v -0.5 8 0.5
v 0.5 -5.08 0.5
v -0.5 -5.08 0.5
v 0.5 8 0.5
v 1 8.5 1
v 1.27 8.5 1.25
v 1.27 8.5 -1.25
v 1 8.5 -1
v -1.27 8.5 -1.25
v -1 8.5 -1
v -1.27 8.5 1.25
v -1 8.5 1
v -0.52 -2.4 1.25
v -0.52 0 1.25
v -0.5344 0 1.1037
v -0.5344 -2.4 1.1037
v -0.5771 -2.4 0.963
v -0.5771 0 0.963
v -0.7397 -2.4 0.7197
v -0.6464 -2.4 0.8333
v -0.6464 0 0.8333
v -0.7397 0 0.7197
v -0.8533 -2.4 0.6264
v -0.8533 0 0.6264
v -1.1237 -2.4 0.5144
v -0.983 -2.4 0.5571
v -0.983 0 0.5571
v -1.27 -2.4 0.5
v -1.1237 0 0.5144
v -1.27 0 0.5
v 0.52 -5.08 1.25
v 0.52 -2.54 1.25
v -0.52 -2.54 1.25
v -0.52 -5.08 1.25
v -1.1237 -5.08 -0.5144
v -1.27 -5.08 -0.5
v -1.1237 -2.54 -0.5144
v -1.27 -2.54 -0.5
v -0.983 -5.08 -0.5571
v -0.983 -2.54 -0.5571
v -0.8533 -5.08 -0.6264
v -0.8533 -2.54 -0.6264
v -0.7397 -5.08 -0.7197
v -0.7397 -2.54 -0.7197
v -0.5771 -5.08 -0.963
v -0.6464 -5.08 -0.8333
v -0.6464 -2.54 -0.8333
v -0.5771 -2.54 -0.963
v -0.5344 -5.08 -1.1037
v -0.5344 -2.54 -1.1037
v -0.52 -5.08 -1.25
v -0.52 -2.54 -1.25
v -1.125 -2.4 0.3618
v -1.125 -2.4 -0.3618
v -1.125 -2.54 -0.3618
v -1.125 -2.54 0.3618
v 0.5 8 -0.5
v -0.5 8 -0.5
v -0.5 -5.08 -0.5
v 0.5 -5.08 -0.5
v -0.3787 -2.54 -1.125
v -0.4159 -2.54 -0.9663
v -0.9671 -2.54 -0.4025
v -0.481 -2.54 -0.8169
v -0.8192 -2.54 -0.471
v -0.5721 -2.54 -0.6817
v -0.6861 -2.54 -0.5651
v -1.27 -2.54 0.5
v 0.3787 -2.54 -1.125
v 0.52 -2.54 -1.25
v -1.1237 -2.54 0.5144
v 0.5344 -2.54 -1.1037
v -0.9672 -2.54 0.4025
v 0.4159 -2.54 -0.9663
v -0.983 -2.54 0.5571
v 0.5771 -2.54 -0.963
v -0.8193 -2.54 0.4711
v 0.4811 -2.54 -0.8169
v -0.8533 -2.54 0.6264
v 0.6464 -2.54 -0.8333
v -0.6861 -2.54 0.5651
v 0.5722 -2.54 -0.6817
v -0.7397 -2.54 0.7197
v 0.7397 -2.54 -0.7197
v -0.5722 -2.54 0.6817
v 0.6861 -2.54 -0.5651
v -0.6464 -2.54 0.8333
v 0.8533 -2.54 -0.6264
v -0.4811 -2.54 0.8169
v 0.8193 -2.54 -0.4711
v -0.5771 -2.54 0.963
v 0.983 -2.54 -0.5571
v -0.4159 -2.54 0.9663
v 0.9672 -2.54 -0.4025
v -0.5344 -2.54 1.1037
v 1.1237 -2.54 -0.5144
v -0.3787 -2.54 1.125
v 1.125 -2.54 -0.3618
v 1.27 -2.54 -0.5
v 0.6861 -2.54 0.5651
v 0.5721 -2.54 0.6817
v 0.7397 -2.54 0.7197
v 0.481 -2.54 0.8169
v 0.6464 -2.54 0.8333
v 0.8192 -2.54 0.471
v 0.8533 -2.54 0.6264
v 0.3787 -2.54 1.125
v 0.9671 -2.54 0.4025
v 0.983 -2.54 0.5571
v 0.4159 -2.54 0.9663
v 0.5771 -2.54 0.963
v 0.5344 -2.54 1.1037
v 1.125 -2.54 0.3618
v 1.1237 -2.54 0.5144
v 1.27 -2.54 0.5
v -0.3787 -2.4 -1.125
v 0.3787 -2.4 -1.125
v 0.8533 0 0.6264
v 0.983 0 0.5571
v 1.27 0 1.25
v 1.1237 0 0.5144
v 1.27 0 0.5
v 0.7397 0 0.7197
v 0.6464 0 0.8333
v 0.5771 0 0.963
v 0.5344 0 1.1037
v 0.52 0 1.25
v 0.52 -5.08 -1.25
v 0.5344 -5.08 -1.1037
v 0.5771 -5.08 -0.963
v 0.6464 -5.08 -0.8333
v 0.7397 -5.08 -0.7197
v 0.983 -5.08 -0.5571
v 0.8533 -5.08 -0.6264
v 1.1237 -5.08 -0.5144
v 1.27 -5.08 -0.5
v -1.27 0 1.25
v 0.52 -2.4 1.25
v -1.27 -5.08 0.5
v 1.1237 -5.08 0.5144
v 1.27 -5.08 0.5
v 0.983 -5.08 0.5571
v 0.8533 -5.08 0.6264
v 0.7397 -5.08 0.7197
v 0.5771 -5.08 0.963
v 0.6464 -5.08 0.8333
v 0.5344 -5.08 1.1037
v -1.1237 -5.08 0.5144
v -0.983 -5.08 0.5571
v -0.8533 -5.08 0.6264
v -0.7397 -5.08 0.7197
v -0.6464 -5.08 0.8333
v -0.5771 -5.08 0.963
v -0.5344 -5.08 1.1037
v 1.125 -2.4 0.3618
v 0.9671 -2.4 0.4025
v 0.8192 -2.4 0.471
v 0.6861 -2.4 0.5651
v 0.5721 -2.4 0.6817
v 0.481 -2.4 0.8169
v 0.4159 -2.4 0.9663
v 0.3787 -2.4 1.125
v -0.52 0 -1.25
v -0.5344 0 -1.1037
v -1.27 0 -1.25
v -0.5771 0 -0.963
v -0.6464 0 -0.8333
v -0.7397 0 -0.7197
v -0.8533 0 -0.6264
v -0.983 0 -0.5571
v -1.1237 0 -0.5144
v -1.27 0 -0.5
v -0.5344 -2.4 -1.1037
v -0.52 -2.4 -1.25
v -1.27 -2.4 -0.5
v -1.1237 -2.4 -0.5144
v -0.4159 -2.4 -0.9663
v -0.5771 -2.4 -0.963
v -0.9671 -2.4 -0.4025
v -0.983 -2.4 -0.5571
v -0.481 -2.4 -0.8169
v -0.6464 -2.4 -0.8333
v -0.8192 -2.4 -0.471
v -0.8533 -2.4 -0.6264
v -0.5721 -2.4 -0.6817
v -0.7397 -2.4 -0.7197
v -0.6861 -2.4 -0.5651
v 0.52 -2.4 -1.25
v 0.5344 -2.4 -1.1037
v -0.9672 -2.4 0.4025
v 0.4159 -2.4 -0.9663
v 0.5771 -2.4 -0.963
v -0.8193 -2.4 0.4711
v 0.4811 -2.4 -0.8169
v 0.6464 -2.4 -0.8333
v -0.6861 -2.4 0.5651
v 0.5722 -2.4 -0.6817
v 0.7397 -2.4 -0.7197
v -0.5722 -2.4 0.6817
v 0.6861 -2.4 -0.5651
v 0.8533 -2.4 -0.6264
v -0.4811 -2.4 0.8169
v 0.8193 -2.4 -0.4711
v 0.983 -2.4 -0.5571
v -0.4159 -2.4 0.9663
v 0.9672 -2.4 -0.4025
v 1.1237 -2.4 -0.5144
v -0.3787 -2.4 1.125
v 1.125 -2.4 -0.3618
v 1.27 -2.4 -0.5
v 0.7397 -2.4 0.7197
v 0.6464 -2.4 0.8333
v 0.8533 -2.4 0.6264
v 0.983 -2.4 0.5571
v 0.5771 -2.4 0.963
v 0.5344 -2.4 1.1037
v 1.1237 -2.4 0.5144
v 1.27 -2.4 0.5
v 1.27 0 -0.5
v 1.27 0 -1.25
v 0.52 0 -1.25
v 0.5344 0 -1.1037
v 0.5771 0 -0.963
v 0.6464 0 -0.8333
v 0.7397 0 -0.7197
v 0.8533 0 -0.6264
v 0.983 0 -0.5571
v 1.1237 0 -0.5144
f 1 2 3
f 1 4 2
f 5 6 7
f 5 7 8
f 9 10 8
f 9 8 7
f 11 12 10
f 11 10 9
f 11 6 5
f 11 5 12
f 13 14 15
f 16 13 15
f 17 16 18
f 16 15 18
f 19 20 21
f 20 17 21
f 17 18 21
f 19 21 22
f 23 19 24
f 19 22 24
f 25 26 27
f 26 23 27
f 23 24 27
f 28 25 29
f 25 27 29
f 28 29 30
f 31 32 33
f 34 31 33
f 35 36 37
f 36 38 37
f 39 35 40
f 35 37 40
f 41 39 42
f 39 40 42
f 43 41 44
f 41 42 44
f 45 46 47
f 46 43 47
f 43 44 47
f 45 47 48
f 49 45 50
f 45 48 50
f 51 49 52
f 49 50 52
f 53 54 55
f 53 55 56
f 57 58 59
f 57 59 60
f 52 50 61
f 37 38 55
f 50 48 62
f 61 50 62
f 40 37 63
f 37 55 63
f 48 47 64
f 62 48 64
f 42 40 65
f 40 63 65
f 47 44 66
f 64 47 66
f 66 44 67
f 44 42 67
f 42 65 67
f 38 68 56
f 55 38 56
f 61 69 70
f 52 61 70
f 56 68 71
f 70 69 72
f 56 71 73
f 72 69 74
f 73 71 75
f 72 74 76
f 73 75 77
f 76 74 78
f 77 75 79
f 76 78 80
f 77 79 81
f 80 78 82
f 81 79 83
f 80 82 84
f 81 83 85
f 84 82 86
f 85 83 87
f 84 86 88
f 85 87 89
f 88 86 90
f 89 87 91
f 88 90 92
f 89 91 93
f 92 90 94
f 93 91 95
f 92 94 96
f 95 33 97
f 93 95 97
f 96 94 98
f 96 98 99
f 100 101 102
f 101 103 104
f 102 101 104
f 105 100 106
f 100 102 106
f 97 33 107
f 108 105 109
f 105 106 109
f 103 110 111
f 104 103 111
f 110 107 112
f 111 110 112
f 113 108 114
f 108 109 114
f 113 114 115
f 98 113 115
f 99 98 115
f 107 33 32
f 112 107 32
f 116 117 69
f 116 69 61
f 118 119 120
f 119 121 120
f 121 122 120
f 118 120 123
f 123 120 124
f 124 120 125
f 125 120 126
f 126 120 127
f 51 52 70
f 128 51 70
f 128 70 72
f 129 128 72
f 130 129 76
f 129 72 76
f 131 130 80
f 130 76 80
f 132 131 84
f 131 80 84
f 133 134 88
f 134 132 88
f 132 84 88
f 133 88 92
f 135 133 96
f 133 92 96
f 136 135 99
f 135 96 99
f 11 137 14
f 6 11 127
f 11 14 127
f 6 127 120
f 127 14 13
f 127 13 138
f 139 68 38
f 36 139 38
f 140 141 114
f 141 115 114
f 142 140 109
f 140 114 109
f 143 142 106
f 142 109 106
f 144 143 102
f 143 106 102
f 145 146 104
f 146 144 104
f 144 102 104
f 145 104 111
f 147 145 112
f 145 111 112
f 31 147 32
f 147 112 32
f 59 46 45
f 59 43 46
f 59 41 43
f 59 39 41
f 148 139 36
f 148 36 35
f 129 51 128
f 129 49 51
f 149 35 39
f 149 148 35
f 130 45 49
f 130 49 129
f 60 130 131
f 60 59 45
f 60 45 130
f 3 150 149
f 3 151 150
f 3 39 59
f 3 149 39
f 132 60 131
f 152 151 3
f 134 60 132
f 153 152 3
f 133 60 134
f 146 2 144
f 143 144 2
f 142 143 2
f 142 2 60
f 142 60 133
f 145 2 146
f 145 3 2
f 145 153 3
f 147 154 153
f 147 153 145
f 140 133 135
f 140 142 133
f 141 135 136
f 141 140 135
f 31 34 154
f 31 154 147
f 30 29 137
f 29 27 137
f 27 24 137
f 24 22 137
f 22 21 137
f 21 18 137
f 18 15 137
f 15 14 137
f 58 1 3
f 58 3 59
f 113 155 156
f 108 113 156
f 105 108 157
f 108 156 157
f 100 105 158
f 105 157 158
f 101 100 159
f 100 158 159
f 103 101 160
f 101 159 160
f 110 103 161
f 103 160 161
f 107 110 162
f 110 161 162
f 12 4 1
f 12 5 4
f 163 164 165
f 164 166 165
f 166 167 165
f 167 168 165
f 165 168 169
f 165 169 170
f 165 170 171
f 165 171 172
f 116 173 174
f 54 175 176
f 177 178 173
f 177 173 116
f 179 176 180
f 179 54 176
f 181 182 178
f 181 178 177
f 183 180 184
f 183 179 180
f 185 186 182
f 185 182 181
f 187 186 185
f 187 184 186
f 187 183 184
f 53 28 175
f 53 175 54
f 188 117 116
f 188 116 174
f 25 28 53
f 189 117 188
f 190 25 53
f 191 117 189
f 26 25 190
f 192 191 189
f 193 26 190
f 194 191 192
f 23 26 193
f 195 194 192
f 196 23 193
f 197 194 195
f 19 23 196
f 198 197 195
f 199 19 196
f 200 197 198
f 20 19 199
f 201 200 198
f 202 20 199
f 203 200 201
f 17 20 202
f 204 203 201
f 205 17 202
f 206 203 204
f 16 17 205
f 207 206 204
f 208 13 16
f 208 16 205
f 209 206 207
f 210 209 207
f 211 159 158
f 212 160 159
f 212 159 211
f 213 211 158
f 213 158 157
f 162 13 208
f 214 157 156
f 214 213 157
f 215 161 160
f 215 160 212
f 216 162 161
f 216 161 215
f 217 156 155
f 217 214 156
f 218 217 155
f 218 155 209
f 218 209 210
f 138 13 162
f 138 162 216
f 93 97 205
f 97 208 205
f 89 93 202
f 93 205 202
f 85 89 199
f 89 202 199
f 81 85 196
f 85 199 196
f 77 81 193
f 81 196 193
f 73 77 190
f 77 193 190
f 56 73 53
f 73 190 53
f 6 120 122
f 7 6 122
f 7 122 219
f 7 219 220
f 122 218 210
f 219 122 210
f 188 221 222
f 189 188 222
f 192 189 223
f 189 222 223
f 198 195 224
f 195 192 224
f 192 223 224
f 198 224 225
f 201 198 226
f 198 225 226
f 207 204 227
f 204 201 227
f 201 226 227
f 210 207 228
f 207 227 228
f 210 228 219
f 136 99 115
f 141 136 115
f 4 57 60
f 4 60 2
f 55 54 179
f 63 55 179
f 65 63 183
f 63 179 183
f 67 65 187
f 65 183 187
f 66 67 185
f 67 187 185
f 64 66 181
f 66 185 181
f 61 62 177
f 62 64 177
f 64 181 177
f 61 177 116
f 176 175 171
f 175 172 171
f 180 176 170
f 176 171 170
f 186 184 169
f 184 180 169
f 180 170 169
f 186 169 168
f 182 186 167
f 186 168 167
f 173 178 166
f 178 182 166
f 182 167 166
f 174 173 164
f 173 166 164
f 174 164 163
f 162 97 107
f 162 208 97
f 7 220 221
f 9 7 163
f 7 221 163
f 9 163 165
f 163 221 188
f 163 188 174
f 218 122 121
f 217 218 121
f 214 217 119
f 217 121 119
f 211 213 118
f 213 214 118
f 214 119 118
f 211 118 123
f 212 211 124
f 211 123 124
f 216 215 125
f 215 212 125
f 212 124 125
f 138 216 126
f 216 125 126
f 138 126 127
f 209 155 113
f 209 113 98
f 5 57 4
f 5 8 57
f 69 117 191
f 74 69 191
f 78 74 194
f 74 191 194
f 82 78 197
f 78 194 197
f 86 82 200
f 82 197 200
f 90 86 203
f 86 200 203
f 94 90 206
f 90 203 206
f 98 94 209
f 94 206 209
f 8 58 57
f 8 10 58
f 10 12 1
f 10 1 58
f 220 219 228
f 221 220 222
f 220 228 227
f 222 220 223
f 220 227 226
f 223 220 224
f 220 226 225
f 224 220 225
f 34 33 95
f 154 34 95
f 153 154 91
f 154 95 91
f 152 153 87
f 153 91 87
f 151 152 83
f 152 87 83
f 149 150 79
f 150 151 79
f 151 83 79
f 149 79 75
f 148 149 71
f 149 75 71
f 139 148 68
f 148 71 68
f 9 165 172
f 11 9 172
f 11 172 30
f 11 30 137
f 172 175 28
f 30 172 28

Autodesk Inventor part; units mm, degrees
ref_plane "YZ Plane" through (0, 0, 0) normal (1, 0, 0) x (0, 1, 0)
ref_plane "XZ Plane" through (0, 0, 0) normal (0, 1, 0) x (-1, 0, 0)
ref_plane "XY Plane" through (0, 0, 0) normal (0, 0, 1) x (1, 0, 0)
sketch "Sketch1" plane through (0, 0, 0) normal (0, 1, 0) x (-1, 0, 0)
  line L0 (1.27, 1.25) -> (-1.27, 1.25)
  line L1 (-1.27, 1.25) -> (-1.27, -1.25)
  line L2 (-1.27, -1.25) -> (1.27, -1.25)
  line L3 (1.27, -1.25) -> (1.27, 1.25)
  line L4 (1.27, 1.25) -> (-1.27, -1.25) construction
  line L5 (-1.27, 1.25) -> (1.27, -1.25) construction
  point P0 (0, 0)
  dimension "d0" = 2.54
  dimension "d1" = 2.5
extrude "Extrusion1" add sketch "Sketch1" along normal blind 8.5
sketch "Sketch2" plane through (0, 0, 0) normal (0, -1, 0) x (1, 0, 0)
  line L0 (-1.27, 1.25) -> (1.27, 1.25) projected
  arc A0 (0.52, 1.25) -> (1.27, 0.5) centre (1.27, 1.25) ccw
  line L1 (-1.27, -1.25) -> (-1.27, 1.25) projected
  arc A1 (-1.27, 0.5) -> (-0.52, 1.25) centre (-1.27, 1.25) ccw
  arc A2 (-0.52, -1.25) -> (-1.27, -0.5) centre (-1.27, -1.25) ccw
  line L2 (1.27, -1.25) -> (-1.27, -1.25) projected
  arc A3 (1.27, -0.5) -> (0.52, -1.25) centre (1.27, -1.25) ccw
  line L3 (1.27, 1.25) -> (1.27, -1.25) projected
  line L4 (-1.27, -1.25) -> (-1.27, 1.25) projected
  line L5 (1.27, -1.25) -> (-1.27, -1.25) projected
  point P0 (0, 0)
  dimension "d4" = 0.75
extrude "Extrusion2" add sketch "Sketch2" along normal blind 2.4 contours L0 A0 L3 A3 L2 A2 L1 A1
sketch "Sketch3" plane through (0, -2.4, 0) normal (0, -1, 0) x (1, 0, 0)
  line L0 (-1.125, 1.125) -> (1.125, 1.125)
  line L1 (1.125, 1.125) -> (1.125, -1.125)
  line L2 (1.125, -1.125) -> (-1.125, -1.125)
  line L3 (-1.125, -1.125) -> (-1.125, 1.125)
  line L4 (-1.125, 1.125) -> (1.125, -1.125) construction
  line L5 (1.125, 1.125) -> (-1.125, -1.125) construction
  arc A0 (-1.125, 0.3618) -> (-0.3787, 1.125) centre (-1.27, 1.25) ccw
  arc A1 (0.3787, 1.125) -> (1.125, 0.3618) centre (1.27, 1.25) ccw
  arc A2 (-0.3787, -1.125) -> (-1.125, -0.3618) centre (-1.27, -1.25) ccw
  arc A3 (1.125, -0.3618) -> (0.3787, -1.125) centre (1.27, -1.25) ccw
  point P0 (0, 0)
  dimension "d7" = 2.25
  dimension "d8" = 0.9
  dimension "d9" = 0.9
  dimension "d10" = 0.9
  dimension "d11" = 0.9
extrude "Extrusion3" add sketch "Sketch3" along normal blind 0.14 contours L0 A1 L1 A3 L2 A2 L3 A0
sketch "Sketch4" plane through (0, -2.54, 0) normal (0, -1, 0) x (1, 0, 0)
  line L0 (0.52, 1.25) -> (-0.52, 1.25) projected
  arc A0 (-1.27, 0.5) -> (-0.52, 1.25) centre (-1.27, 1.25) ccw projected
  line L1 (-1.27, 0.5) -> (-1.27, -0.5) projected
  arc A1 (-0.52, -1.25) -> (-1.27, -0.5) centre (-1.27, -1.25) ccw projected
  line L2 (-0.52, -1.25) -> (0.52, -1.25) projected
  arc A2 (1.27, -0.5) -> (0.52, -1.25) centre (1.27, -1.25) ccw projected
  line L3 (1.27, -0.5) -> (1.27, 0.5) projected
  arc A3 (0.52, 1.25) -> (1.27, 0.5) centre (1.27, 1.25) ccw projected
  point P0 (0, 0)
extrude "Extrusion4" add sketch "Sketch4" along normal blind 2.54
sketch "Sketch5" plane through (0, 8.5, 0) normal (0, 1, 0) x (1, 0, 0)
  line L0 (-0.5, 0.5) -> (0.5, 0.5)
  line L1 (0.5, 0.5) -> (0.5, -0.5)
  line L2 (0.5, -0.5) -> (-0.5, -0.5)
  line L3 (-0.5, -0.5) -> (-0.5, 0.5)
  line L4 (-0.5, 0.5) -> (0.5, -0.5) construction
  line L5 (0.5, 0.5) -> (-0.5, -0.5) construction
  point P0 (0, 0)
  dimension "d16" = 1
extrude "Extrusion5" cut sketch "Sketch5" against normal through all
chamfer "Chamfer1" distance 0.5 angle 45 4 edges at (0, 8.5, -0.5) (-0.5, 8.5, 0) (0, 8.5, 0.5) (0.5, 8.5, 0)
properties part number "SMT GPIO Female Header 2x20"
